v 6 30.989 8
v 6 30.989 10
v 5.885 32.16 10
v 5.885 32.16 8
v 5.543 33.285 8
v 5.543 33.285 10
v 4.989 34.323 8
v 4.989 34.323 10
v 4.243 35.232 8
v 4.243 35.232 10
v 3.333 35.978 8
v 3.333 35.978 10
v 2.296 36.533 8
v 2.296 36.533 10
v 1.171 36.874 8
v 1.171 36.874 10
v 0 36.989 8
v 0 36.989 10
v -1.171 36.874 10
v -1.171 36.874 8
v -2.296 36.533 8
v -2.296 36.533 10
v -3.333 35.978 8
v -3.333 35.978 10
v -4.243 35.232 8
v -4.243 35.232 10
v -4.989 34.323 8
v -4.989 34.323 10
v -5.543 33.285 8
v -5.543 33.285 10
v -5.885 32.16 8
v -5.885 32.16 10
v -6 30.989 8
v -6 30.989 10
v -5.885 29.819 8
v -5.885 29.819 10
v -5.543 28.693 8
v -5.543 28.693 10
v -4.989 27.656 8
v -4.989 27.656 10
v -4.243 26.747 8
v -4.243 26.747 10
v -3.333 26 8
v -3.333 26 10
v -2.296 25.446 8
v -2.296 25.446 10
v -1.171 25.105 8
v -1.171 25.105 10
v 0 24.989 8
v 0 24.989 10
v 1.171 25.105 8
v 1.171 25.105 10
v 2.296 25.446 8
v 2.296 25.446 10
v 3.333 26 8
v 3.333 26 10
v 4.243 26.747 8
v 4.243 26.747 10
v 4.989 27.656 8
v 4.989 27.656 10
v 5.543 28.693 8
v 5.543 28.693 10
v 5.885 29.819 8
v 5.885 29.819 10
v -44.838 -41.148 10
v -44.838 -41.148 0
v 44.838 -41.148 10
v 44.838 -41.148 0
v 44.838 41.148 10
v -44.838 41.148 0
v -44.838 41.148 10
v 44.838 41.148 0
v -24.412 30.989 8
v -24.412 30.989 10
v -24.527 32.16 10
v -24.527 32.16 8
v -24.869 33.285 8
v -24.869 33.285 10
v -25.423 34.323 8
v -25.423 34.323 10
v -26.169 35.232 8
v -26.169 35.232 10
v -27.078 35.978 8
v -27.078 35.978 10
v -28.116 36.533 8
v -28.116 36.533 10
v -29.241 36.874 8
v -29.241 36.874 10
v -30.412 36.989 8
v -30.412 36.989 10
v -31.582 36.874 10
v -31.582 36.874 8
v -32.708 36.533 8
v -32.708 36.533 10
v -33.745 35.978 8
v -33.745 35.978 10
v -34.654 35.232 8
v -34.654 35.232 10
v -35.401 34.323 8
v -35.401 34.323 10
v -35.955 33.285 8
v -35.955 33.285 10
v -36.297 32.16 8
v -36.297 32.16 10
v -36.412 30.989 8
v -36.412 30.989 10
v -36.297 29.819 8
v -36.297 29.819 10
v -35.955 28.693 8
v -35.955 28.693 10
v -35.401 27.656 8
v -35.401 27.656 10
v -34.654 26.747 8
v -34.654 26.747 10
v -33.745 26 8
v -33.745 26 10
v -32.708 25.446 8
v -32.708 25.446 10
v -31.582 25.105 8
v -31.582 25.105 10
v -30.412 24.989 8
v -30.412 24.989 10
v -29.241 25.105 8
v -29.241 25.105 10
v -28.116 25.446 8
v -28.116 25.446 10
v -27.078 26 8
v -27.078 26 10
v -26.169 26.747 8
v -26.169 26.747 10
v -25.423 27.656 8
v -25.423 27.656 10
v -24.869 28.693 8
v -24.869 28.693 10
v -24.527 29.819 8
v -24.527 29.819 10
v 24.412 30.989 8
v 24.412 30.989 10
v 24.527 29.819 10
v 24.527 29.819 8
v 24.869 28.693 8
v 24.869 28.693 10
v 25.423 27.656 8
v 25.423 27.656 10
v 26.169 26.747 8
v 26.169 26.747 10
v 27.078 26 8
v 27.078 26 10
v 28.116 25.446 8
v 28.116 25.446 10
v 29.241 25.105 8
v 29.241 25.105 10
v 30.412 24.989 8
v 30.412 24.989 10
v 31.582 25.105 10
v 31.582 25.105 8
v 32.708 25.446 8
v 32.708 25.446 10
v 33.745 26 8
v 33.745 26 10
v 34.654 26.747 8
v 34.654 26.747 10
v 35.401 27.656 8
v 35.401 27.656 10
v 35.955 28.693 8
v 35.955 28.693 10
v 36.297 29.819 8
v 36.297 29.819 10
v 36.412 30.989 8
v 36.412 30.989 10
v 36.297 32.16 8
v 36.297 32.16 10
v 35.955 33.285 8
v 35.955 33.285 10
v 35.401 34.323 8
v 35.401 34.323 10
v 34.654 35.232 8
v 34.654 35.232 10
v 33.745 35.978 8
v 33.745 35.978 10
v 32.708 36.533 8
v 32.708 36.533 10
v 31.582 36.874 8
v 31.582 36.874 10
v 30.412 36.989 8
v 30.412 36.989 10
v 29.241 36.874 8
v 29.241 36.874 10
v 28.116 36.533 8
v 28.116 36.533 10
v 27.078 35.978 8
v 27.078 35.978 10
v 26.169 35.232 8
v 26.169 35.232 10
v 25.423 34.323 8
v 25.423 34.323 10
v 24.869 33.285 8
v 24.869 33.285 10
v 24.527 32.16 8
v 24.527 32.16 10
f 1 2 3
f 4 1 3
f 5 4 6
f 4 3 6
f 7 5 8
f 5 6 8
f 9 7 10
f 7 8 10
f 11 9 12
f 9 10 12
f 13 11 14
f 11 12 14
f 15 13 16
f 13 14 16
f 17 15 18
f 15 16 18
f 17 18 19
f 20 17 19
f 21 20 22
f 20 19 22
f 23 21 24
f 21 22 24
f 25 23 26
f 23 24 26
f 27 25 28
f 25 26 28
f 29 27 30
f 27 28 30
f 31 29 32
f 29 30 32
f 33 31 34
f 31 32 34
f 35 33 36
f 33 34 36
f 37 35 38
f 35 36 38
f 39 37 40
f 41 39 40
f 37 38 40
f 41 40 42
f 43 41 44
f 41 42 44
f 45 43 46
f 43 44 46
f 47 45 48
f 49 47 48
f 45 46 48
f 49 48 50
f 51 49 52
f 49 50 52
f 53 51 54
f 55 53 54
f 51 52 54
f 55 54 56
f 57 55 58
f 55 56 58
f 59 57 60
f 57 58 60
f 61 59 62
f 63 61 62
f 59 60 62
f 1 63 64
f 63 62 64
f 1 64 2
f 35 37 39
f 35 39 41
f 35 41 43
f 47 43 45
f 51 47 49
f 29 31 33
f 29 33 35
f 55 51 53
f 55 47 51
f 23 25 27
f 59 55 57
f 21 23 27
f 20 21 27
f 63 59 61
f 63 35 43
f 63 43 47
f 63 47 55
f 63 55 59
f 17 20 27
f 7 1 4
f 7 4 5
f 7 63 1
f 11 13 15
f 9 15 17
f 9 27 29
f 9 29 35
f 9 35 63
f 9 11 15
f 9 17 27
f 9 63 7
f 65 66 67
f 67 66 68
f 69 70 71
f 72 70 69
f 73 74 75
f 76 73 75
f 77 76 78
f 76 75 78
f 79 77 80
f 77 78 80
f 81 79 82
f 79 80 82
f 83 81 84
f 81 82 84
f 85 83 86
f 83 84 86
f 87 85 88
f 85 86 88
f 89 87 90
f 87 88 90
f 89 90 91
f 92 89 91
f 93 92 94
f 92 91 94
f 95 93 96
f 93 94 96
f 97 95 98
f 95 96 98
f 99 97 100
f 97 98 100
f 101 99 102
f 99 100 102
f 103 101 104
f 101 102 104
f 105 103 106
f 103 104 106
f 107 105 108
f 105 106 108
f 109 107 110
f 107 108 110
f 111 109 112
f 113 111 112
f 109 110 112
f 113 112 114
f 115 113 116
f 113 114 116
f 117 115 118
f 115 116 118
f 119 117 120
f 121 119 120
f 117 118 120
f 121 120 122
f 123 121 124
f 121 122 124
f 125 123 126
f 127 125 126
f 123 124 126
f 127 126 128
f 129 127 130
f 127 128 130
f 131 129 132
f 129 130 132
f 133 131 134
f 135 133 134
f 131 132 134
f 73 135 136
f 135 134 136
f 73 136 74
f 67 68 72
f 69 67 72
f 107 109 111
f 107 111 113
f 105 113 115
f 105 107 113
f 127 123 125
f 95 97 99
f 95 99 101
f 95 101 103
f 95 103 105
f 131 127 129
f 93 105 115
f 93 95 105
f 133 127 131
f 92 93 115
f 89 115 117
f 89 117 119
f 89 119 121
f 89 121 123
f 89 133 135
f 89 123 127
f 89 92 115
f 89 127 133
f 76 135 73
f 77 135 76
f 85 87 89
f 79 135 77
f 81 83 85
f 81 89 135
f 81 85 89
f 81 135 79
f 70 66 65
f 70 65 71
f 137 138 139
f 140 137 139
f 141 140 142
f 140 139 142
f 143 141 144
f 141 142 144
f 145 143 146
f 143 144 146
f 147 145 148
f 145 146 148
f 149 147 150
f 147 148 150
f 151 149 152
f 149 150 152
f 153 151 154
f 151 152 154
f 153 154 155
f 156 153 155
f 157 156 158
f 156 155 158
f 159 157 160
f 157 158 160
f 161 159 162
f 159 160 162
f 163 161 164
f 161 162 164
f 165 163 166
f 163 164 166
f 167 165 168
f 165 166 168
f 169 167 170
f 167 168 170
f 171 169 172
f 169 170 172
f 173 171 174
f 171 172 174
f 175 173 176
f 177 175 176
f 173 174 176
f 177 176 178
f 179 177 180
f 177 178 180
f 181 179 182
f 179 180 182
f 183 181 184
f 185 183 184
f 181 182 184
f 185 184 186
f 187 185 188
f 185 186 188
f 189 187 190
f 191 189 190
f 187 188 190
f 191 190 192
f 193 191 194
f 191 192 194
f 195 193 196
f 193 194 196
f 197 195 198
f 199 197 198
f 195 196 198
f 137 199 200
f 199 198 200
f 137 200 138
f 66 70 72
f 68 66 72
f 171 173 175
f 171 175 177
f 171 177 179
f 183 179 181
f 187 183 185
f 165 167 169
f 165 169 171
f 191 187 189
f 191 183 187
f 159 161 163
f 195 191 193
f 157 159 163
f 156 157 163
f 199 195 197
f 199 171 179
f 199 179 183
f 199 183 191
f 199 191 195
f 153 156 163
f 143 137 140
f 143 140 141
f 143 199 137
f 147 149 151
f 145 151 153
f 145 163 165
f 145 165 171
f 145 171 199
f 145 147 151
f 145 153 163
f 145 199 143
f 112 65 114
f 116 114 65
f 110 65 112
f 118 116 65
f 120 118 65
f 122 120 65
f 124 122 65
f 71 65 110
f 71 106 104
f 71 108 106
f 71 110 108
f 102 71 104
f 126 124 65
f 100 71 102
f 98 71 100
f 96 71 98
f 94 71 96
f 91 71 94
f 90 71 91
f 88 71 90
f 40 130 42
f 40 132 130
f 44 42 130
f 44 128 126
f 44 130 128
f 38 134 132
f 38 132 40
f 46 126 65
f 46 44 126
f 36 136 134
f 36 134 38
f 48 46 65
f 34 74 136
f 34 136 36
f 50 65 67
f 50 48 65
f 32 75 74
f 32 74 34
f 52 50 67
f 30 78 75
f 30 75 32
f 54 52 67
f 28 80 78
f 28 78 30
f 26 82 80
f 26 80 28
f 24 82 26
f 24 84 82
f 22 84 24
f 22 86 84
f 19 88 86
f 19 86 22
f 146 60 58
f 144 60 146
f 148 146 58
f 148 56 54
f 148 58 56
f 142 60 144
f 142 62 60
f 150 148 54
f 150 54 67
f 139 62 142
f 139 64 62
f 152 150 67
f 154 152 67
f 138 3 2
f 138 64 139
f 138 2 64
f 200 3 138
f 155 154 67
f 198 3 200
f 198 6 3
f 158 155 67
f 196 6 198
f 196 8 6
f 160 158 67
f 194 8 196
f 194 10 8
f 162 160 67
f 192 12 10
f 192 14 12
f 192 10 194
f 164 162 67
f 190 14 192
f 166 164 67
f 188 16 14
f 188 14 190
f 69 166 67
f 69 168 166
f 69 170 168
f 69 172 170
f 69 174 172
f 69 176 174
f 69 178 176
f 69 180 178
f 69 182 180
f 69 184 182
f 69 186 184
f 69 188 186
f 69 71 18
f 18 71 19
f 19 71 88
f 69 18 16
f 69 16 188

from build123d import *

# Parameters (mm, degrees)
SKETCH_1_W          = 89.675670072
SKETCH_1_H          = 82.296703234
EXTRUDE_1_DEPTH     = 10
SKETCH_3_R          = 6
CUT_EXTRUDE_1_DEPTH = 2
SKETCH_4_R          = 6
CUT_EXTRUDE_2_DEPTH = 2


with BuildPart() as part:
    # 草图1 → 凸台-拉伸1 (new body)
    with BuildSketch(Plane.XY):
        Rectangle(SKETCH_1_W, SKETCH_1_H)
    extrude(amount=EXTRUDE_1_DEPTH)

    # 草图3 → 切除-拉伸1 (cut)
    with BuildSketch(Plane.XY.offset(10)):
        with Locations((-30.411848961, 30.989289131)):
            Circle(SKETCH_3_R)
        with Locations((30.411848961, 30.989289131)):
            Circle(SKETCH_3_R)
    extrude(amount=-CUT_EXTRUDE_1_DEPTH, mode=Mode.SUBTRACT)

    # 草图4 → 切除-拉伸2 (cut)
    with BuildSketch(Plane.XY.offset(10)):
        with Locations((0, 30.989289131)):
            Circle(SKETCH_4_R)
    extrude(amount=-CUT_EXTRUDE_2_DEPTH, mode=Mode.SUBTRACT)


solid = part.part
